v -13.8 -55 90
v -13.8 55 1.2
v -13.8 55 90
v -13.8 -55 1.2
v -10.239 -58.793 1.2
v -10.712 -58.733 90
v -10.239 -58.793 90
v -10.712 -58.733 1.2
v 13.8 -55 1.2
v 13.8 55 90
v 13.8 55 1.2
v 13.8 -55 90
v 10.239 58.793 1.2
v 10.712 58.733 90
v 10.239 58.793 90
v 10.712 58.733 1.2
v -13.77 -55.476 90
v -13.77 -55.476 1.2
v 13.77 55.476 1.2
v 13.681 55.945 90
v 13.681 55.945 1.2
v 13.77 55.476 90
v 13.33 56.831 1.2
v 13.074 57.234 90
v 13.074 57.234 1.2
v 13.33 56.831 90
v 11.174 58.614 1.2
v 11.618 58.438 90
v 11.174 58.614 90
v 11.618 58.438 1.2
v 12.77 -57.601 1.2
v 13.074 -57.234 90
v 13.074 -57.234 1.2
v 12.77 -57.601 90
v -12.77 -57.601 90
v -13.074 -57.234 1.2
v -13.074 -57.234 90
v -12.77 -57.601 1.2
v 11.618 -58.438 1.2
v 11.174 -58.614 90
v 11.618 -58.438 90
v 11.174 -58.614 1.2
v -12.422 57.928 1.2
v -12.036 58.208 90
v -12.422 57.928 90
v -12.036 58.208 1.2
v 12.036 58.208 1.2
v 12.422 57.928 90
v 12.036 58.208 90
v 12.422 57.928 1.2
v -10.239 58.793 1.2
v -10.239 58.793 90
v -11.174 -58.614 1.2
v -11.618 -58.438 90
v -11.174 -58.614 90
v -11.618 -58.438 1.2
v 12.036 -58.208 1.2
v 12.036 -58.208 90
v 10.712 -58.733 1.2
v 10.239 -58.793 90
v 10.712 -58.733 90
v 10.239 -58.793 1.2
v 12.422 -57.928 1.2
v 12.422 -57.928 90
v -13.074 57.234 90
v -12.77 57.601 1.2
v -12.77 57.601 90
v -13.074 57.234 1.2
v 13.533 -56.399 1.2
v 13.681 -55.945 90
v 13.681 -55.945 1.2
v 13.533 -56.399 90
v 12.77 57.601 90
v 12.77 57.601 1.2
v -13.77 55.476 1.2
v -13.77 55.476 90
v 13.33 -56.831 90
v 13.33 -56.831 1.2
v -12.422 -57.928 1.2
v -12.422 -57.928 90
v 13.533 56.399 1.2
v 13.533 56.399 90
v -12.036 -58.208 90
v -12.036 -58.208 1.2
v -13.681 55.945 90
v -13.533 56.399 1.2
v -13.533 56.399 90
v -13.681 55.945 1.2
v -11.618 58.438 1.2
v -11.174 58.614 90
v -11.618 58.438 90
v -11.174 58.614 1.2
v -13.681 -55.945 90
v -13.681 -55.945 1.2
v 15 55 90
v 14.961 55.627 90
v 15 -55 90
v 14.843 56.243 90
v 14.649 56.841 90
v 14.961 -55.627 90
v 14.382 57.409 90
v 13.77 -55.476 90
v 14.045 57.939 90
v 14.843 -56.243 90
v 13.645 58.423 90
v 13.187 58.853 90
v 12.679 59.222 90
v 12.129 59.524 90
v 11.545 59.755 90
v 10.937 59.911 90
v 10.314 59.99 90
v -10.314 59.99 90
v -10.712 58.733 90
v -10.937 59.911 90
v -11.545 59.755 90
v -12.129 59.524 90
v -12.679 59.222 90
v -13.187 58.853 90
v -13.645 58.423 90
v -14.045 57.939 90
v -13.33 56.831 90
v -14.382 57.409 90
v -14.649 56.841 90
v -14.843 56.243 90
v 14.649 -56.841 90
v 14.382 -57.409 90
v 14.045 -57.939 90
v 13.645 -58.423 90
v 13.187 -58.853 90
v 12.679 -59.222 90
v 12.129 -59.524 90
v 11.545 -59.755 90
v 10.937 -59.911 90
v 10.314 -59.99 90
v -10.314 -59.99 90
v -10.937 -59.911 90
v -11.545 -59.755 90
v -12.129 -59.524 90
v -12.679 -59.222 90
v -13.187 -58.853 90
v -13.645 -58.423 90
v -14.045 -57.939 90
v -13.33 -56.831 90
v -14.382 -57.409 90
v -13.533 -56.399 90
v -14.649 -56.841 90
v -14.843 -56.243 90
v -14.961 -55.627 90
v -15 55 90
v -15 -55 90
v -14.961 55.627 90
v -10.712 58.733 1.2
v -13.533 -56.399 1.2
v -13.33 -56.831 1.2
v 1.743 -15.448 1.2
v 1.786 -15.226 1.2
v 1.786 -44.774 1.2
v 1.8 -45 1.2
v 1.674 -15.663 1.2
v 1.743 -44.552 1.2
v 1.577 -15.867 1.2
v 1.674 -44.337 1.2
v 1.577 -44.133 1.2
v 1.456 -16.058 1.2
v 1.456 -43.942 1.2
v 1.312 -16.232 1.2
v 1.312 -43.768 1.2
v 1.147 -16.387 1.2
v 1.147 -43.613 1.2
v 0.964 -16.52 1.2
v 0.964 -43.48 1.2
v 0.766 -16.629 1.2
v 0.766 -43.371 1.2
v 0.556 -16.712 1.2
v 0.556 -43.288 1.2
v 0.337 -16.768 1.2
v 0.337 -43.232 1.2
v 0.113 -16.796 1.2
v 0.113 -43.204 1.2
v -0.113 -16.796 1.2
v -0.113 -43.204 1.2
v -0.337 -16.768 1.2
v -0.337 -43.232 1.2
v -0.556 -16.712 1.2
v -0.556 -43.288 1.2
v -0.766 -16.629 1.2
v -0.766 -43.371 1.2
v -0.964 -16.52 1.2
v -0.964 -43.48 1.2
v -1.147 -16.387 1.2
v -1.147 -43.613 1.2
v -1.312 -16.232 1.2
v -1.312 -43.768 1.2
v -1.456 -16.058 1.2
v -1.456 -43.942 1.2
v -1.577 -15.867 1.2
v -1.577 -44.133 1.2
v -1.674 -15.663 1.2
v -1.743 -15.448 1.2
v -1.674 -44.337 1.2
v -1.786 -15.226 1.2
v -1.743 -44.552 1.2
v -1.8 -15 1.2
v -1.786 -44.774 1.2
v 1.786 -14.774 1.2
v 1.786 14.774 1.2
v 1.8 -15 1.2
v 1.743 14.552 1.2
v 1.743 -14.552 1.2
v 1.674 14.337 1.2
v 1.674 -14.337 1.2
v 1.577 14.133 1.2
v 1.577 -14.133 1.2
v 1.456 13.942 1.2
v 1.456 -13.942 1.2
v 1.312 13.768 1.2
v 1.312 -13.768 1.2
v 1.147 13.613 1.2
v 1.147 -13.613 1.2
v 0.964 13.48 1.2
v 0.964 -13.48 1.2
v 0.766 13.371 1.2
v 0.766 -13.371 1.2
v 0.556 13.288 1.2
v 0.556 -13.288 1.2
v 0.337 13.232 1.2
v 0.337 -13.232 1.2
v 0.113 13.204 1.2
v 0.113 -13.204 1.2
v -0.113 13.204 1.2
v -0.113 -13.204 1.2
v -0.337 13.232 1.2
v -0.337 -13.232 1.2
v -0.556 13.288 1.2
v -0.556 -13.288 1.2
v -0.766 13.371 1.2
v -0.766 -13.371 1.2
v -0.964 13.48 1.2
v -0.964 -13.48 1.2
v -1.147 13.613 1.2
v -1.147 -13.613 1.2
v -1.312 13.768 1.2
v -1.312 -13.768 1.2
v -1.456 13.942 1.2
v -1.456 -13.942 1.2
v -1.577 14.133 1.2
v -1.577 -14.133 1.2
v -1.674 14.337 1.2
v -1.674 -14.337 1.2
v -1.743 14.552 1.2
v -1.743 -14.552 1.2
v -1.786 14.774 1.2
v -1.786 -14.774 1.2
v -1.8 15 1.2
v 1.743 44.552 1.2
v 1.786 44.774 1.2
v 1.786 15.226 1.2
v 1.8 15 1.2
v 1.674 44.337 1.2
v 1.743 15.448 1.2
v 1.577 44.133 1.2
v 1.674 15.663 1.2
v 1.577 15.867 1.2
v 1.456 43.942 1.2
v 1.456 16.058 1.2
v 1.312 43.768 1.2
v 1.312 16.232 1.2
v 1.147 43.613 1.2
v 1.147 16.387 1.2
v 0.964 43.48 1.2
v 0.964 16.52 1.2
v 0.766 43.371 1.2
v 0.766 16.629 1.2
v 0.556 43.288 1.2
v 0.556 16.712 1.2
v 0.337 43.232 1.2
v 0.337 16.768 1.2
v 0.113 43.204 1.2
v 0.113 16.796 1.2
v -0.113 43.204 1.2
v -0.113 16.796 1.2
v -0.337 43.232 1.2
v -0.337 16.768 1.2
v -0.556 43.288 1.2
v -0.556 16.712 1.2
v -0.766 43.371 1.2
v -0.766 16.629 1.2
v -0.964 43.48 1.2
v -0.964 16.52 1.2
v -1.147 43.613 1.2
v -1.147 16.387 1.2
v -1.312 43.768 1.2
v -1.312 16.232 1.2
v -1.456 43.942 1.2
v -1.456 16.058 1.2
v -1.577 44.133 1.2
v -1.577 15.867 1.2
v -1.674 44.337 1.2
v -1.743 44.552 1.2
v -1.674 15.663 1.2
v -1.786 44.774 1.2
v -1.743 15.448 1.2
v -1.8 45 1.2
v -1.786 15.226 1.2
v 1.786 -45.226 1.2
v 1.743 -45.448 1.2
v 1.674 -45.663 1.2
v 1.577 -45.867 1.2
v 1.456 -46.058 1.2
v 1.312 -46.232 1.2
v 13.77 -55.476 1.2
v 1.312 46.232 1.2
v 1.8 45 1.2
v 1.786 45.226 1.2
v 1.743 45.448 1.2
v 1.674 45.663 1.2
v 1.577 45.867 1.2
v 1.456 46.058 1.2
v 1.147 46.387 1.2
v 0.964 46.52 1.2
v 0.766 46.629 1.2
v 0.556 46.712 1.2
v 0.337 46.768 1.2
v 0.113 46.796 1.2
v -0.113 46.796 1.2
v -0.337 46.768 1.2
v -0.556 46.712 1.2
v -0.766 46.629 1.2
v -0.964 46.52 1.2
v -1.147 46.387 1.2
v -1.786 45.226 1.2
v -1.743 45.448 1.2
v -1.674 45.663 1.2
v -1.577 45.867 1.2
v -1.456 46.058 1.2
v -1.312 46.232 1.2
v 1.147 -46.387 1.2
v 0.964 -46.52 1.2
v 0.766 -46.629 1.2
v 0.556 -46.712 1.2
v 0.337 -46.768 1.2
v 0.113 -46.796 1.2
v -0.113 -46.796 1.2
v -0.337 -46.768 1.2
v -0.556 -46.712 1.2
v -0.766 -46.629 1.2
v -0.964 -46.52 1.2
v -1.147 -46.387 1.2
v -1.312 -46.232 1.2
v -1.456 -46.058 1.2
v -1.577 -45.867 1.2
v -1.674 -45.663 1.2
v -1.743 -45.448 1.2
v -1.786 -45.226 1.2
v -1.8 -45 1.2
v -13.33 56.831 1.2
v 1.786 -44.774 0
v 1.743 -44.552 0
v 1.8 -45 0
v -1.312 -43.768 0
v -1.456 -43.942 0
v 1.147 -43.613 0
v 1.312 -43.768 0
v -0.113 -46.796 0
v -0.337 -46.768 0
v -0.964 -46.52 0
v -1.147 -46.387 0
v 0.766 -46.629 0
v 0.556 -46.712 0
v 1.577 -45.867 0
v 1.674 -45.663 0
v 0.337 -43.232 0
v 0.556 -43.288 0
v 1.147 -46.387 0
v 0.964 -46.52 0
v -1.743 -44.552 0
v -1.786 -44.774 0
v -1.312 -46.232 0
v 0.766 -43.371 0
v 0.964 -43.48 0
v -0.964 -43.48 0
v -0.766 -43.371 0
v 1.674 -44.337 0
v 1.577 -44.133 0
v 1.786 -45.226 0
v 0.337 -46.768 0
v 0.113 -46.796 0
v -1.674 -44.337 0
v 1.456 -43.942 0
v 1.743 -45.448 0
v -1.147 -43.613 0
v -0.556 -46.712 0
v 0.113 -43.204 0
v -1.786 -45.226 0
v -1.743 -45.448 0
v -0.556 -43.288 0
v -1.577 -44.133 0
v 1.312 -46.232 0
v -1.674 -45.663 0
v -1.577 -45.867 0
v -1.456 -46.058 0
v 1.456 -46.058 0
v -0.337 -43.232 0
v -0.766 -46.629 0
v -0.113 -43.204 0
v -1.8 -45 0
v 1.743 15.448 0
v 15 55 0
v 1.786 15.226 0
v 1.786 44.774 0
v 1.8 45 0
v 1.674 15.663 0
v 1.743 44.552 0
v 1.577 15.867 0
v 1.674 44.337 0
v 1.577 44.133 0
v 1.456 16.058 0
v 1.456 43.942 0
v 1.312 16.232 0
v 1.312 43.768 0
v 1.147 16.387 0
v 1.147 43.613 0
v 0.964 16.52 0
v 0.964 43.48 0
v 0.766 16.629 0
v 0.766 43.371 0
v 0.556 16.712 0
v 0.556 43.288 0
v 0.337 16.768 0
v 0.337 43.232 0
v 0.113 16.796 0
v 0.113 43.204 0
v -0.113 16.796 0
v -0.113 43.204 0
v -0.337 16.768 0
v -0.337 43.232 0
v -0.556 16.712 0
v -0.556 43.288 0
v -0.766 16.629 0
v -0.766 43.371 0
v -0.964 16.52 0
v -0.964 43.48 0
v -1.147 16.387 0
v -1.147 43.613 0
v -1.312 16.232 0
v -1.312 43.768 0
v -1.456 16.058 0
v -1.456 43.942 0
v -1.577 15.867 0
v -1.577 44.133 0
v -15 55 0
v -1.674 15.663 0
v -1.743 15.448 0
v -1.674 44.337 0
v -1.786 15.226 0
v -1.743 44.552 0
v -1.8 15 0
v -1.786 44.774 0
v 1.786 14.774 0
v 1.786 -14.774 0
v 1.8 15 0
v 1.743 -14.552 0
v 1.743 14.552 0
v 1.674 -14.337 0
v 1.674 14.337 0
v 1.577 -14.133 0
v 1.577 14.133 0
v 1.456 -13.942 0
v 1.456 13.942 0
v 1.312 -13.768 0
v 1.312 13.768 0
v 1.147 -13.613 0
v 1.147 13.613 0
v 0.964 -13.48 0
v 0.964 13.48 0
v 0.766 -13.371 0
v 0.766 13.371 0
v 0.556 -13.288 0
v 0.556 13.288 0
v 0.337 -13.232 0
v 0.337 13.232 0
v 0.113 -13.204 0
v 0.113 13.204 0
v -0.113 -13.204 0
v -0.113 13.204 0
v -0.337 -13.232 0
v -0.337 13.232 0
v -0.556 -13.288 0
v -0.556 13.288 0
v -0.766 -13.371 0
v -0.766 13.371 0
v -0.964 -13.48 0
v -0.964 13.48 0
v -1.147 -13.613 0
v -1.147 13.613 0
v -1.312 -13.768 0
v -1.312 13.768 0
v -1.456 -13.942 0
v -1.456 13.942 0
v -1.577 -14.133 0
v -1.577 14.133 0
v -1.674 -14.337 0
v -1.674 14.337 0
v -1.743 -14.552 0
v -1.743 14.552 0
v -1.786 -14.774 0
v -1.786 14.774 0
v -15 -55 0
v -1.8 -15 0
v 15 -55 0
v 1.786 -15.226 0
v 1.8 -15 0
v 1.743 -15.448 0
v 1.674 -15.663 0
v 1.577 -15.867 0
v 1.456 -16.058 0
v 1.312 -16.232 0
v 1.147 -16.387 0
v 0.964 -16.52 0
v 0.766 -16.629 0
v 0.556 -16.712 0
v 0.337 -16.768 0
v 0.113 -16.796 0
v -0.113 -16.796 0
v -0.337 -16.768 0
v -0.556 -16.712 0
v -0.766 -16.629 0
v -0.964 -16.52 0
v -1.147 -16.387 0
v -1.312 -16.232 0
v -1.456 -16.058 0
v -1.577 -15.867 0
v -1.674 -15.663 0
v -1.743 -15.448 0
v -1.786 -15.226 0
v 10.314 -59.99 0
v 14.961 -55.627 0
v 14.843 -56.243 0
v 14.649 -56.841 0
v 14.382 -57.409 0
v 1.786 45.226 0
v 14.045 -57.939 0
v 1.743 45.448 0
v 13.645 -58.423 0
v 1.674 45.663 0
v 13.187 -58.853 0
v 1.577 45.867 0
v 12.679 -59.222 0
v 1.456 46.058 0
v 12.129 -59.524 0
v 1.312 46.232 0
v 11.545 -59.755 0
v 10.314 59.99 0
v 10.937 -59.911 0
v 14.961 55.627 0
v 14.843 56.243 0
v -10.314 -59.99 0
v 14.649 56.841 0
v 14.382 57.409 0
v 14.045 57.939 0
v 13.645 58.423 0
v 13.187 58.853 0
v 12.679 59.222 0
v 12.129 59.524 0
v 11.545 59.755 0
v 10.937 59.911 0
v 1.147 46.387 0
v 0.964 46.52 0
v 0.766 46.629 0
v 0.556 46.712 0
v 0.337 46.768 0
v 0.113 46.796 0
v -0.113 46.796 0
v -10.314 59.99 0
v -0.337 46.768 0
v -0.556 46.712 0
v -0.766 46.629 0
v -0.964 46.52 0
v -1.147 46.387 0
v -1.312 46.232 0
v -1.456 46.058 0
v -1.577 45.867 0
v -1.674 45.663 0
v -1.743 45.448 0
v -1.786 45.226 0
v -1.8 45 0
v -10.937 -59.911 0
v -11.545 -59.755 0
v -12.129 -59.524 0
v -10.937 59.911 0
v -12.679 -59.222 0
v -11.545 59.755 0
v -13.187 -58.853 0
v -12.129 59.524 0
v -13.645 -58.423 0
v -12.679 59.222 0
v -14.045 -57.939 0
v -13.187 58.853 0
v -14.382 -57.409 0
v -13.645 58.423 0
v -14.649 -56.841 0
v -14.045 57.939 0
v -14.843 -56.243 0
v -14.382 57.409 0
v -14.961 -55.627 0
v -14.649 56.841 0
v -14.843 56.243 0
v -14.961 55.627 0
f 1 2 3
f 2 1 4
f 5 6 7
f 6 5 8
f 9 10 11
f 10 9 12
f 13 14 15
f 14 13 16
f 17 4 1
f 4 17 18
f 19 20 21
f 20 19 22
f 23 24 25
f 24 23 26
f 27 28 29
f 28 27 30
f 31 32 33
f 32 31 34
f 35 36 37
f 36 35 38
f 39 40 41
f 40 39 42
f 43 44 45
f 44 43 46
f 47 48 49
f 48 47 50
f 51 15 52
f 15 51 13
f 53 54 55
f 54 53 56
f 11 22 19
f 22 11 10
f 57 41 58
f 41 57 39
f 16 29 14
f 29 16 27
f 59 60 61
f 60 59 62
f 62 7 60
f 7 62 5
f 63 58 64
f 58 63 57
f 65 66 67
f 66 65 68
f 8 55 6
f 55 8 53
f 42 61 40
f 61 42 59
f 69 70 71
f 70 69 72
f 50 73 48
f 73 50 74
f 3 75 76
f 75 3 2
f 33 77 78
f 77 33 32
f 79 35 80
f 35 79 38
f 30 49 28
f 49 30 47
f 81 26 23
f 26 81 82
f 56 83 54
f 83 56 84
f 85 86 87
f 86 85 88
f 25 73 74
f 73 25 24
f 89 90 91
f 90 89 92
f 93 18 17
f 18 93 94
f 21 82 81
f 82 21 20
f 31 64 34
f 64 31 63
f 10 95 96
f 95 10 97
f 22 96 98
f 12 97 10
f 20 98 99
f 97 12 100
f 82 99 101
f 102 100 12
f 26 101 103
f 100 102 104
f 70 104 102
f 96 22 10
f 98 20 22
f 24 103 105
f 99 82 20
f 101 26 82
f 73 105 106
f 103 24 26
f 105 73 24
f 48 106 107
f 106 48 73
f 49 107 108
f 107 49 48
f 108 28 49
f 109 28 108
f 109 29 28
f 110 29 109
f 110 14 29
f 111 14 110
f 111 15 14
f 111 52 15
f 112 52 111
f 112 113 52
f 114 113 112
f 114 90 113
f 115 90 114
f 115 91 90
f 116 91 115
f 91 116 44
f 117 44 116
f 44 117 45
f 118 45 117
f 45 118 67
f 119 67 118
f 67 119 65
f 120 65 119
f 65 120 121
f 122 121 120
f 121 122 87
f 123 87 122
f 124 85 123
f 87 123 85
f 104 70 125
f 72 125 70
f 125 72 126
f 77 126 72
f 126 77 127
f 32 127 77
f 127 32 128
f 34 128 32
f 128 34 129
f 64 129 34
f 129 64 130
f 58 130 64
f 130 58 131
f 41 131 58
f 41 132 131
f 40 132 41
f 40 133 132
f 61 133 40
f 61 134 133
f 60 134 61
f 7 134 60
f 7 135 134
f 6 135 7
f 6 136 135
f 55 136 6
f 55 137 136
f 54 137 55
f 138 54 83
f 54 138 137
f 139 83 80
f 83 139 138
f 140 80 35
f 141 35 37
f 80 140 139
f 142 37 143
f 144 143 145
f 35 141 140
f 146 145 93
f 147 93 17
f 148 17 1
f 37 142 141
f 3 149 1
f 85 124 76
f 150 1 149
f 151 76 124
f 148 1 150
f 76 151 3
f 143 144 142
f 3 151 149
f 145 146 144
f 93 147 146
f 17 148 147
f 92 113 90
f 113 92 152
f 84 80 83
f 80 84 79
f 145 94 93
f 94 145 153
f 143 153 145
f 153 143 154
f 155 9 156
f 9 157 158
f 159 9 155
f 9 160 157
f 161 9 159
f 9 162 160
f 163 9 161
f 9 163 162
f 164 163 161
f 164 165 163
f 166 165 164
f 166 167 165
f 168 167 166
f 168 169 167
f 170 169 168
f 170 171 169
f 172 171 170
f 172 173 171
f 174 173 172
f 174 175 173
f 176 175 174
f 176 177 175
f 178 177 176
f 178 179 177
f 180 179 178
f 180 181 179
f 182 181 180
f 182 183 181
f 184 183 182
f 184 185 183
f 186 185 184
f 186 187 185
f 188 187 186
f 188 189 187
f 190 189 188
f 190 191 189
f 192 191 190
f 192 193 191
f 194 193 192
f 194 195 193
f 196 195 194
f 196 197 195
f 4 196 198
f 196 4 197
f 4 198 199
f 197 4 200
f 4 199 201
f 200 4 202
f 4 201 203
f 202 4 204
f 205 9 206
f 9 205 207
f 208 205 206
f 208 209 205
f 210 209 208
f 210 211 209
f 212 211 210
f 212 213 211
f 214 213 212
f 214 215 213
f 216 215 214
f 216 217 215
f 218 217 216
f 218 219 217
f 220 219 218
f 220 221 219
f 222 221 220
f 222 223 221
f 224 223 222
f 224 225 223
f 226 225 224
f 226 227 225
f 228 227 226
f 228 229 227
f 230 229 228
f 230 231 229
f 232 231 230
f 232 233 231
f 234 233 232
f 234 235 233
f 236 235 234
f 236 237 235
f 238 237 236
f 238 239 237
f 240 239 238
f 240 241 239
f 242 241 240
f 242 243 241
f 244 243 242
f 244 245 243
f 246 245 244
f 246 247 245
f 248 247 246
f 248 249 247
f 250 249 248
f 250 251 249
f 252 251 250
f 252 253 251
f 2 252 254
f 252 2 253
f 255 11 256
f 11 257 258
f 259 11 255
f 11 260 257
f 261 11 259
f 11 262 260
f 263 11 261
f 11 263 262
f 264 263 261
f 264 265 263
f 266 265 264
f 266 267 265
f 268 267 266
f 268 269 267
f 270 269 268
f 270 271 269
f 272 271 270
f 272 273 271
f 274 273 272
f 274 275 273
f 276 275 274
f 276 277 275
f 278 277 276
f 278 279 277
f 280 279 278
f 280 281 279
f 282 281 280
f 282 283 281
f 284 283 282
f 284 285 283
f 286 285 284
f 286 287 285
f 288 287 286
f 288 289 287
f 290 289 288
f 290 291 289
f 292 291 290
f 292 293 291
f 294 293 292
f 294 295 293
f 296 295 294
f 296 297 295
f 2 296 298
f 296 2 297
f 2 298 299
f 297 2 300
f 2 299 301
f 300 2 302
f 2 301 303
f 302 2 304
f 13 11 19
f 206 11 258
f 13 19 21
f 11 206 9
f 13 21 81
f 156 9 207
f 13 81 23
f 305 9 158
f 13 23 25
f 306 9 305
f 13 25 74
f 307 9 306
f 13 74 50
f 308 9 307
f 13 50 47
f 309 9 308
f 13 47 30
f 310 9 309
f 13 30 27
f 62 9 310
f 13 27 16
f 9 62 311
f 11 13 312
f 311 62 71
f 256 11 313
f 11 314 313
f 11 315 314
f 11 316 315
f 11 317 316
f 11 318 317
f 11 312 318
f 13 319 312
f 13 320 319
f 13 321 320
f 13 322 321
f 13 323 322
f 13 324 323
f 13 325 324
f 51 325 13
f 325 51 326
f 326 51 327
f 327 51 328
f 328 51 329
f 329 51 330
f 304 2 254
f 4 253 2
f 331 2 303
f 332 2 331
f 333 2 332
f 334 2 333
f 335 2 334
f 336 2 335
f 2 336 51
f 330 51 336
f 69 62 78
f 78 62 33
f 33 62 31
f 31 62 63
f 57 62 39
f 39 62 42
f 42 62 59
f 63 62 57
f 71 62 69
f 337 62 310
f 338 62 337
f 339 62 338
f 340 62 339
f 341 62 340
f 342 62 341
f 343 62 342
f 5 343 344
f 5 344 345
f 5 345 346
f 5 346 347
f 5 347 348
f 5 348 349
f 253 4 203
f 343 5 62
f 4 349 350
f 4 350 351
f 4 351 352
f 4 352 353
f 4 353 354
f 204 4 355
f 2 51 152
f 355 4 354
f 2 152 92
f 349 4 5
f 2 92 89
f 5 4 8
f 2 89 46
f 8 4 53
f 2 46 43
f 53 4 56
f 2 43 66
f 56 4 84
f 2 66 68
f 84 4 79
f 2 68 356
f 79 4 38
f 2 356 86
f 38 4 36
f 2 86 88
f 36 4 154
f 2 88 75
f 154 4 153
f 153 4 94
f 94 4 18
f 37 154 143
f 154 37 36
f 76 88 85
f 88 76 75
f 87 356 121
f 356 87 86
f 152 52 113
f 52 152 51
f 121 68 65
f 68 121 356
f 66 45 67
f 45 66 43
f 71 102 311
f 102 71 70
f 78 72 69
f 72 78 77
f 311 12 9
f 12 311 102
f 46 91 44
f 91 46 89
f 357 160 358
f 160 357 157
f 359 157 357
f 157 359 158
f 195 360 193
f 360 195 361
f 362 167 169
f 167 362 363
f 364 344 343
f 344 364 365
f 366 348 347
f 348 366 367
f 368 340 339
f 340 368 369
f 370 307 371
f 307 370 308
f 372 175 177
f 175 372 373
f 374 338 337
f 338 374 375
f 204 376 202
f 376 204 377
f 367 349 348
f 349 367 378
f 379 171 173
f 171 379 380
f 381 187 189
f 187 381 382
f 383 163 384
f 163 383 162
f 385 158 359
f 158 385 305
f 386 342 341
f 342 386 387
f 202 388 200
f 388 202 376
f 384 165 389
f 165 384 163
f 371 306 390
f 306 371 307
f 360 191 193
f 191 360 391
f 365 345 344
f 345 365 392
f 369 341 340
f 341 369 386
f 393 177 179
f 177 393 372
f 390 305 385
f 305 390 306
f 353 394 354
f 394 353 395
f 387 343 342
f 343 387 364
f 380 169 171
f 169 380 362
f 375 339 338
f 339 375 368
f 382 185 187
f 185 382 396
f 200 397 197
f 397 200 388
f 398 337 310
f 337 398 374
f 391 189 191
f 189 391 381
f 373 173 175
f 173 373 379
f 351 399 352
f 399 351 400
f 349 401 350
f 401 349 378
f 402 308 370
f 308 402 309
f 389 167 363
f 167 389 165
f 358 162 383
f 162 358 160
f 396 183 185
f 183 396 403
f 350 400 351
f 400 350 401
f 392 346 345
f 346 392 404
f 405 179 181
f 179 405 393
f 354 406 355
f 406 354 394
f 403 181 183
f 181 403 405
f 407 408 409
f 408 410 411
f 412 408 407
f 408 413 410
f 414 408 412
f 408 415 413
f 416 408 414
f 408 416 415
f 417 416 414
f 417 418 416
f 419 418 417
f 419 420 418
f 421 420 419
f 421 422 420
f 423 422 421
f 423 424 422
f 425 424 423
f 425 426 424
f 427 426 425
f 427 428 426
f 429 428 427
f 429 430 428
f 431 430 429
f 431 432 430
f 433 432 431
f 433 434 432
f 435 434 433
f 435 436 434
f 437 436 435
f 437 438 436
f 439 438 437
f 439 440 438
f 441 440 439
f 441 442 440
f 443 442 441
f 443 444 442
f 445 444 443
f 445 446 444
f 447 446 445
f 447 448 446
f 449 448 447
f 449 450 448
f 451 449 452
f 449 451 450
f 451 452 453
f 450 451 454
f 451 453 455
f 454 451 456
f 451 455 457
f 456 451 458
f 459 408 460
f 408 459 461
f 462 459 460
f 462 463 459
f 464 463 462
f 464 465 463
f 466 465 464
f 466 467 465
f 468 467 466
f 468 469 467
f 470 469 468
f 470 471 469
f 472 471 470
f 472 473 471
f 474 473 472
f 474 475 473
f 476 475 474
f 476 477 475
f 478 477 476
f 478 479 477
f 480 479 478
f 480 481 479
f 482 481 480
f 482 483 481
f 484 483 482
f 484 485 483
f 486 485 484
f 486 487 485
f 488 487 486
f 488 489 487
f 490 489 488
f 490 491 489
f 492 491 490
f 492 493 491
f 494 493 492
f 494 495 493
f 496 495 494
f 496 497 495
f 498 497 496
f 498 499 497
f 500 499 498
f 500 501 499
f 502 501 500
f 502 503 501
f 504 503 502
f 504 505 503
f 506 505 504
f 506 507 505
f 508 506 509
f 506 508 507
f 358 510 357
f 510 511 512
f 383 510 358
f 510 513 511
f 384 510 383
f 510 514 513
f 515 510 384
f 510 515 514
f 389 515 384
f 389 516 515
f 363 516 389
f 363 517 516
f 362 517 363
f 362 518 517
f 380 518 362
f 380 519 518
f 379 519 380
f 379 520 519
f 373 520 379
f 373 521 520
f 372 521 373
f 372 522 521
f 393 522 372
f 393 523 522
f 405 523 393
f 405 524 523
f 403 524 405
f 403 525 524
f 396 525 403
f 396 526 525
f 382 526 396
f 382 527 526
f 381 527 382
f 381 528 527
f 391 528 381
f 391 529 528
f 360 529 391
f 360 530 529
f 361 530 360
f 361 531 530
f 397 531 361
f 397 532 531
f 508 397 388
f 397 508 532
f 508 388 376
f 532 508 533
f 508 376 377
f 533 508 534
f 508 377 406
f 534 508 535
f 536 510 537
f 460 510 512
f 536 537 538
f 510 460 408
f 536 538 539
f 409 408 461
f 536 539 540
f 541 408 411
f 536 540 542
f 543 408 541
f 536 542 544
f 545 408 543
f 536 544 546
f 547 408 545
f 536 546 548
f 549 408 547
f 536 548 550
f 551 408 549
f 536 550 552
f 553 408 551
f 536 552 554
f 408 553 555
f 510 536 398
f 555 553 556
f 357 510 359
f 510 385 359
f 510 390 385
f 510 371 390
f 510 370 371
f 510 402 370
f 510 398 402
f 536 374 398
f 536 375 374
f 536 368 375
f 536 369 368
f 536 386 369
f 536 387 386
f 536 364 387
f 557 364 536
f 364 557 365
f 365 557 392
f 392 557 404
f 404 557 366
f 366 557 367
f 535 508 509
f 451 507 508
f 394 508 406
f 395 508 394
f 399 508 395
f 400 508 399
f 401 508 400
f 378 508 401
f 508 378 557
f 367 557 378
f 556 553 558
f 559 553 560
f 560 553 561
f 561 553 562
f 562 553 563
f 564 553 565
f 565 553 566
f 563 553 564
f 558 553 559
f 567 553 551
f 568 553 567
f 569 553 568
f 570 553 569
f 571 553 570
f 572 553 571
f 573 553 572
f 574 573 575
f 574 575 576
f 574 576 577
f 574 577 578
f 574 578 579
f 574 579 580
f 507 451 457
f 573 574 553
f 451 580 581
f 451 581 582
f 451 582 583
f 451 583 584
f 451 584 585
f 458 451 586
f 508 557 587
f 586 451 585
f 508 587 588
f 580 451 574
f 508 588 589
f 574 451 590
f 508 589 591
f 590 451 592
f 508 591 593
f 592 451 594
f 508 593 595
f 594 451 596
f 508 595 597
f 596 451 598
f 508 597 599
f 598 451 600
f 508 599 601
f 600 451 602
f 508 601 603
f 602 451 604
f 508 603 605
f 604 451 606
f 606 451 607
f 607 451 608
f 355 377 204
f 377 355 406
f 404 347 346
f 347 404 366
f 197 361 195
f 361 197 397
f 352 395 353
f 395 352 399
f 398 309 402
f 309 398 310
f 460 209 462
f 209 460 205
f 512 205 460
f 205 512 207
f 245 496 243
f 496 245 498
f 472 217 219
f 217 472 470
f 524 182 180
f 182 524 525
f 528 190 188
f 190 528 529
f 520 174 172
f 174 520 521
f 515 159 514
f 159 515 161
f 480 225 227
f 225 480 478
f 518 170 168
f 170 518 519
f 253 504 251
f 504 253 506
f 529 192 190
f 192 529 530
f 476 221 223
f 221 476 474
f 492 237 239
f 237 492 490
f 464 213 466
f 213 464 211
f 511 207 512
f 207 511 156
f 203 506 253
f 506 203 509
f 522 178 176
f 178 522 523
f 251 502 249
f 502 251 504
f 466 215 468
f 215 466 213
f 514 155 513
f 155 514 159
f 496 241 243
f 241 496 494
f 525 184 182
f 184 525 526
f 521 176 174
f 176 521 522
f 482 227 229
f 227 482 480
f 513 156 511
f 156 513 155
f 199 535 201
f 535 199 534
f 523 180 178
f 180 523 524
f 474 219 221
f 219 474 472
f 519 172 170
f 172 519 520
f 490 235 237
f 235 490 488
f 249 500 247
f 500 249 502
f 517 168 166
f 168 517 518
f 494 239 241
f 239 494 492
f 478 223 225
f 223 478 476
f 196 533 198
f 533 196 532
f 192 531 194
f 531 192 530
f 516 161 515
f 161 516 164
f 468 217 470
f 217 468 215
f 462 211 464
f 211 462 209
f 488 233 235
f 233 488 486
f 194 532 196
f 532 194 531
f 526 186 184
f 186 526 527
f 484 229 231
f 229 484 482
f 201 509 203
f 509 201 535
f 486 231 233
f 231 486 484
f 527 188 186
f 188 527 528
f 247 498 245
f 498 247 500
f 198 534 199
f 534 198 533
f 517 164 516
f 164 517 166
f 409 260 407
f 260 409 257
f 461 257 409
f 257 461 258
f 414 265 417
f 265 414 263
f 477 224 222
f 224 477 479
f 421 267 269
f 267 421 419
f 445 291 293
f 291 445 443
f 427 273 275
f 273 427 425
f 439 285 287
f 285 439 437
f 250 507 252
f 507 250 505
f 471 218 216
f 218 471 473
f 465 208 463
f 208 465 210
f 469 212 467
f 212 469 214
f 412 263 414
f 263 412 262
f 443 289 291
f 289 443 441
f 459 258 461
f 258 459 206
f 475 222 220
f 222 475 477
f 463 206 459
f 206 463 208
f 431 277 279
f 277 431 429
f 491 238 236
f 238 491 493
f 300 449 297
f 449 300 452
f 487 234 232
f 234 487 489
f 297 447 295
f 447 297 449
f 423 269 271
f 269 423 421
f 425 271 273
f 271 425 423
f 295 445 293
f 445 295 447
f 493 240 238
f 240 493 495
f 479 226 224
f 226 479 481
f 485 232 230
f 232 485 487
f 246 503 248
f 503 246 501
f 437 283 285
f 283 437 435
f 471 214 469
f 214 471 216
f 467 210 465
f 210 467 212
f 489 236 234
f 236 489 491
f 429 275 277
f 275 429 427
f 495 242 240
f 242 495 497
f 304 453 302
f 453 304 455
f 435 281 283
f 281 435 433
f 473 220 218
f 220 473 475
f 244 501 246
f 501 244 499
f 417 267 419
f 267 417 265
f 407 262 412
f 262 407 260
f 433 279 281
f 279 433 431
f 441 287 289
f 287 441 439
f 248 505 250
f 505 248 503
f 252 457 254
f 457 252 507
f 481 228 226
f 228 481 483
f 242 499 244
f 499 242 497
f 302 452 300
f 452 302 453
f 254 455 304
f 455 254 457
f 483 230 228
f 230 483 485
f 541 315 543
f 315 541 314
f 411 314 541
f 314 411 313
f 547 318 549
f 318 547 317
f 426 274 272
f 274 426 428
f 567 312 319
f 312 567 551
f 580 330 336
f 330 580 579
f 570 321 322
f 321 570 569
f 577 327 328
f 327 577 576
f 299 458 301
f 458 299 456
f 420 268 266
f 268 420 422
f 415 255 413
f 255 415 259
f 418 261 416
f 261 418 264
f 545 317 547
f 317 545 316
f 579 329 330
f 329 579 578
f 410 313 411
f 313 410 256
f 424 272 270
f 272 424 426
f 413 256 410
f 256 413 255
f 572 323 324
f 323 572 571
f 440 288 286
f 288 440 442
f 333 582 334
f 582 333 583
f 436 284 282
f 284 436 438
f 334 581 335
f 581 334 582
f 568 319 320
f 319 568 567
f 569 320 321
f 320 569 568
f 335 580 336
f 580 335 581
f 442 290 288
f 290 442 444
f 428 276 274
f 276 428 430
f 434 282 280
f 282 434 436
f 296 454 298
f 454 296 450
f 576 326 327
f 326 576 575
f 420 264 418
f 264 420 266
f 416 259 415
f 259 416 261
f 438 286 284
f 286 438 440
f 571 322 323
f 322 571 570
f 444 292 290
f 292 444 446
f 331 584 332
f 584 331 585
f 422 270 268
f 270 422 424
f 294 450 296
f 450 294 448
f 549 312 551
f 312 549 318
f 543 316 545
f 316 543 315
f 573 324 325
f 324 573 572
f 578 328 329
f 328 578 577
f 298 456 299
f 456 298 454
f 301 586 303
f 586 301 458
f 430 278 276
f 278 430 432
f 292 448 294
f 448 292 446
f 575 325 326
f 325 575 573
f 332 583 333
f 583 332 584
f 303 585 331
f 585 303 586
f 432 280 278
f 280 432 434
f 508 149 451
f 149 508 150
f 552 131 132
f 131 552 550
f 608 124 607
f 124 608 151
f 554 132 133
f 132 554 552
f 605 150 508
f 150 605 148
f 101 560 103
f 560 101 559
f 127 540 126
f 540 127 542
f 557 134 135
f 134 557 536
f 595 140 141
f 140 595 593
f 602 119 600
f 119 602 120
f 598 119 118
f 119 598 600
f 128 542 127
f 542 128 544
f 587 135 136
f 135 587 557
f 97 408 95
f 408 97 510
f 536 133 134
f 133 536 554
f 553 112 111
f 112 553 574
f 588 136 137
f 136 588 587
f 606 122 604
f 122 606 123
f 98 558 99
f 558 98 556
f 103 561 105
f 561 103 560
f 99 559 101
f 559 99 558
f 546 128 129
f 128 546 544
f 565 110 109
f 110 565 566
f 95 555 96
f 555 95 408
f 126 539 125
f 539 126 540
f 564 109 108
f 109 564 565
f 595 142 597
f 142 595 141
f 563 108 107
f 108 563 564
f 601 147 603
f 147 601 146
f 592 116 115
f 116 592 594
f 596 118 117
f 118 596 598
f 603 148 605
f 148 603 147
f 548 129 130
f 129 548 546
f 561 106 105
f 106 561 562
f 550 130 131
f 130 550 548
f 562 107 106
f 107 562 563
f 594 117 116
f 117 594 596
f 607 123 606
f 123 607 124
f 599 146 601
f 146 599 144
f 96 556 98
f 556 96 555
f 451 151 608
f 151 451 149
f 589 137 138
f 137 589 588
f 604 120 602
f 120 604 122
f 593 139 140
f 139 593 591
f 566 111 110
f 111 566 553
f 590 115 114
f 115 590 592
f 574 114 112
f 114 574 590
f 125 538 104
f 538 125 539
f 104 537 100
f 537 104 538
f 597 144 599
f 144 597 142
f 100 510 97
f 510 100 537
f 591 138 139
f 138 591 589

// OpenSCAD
$fn = 50;


difference() {
	union() {
		hull() {
			translate(v = [-10.0000000000, 55.0000000000, 0]) {
				cylinder(h = 90, r = 5);
			}
			translate(v = [10.0000000000, 55.0000000000, 0]) {
				cylinder(h = 90, r = 5);
			}
			translate(v = [-10.0000000000, -55.0000000000, 0]) {
				cylinder(h = 90, r = 5);
			}
			translate(v = [10.0000000000, -55.0000000000, 0]) {
				cylinder(h = 90, r = 5);
			}
		}
	}
	union() {
		translate(v = [0, 0, 1.2000000000]) {
			hull() {
				translate(v = [-10.0000000000, 55.0000000000, 0]) {
					cylinder(h = 88.8000000000, r = 3.8000000000);
				}
				translate(v = [10.0000000000, 55.0000000000, 0]) {
					cylinder(h = 88.8000000000, r = 3.8000000000);
				}
				translate(v = [-10.0000000000, -55.0000000000, 0]) {
					cylinder(h = 88.8000000000, r = 3.8000000000);
				}
				translate(v = [10.0000000000, -55.0000000000, 0]) {
					cylinder(h = 88.8000000000, r = 3.8000000000);
				}
			}
		}
		#translate(v = [0.0000000000, -45.0000000000, 0]) {
			cylinder(h = 1.2000000000, r = 1.8000000000);
		}
		#translate(v = [0.0000000000, -15.0000000000, 0]) {
			cylinder(h = 1.2000000000, r = 1.8000000000);
		}
		#translate(v = [0.0000000000, 15.0000000000, 0]) {
			cylinder(h = 1.2000000000, r = 1.8000000000);
		}
		#translate(v = [0.0000000000, 45.0000000000, 0]) {
			cylinder(h = 1.2000000000, r = 1.8000000000);
		}
	}
}
